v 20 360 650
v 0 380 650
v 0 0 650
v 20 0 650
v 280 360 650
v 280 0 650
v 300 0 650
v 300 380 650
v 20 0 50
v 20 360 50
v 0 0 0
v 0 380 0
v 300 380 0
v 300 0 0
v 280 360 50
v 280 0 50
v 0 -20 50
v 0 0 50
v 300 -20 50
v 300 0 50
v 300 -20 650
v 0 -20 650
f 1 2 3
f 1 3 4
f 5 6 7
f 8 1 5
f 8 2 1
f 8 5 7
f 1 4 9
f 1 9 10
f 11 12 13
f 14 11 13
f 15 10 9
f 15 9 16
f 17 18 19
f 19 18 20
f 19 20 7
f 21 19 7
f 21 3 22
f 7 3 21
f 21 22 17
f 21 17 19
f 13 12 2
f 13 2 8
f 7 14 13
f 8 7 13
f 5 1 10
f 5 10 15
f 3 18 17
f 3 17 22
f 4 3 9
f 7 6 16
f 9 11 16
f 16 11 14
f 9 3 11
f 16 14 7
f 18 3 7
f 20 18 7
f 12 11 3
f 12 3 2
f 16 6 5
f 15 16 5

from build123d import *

# Parameters (mm, degrees)
F2_W     = 300
F2_H     = 380
F3_DEPTH = 650
F4_W     = 300
F4_H     = 600
F5_DEPTH = 20
F6_W     = 260
F6_H     = 360
F7_DEPTH = 600


with BuildPart() as f3:
    # F2 (on Top) → F3 (new body)
    with BuildSketch(Plane.XY):
        with Locations((150, 190)):
            Rectangle(F2_W, F2_H)
    extrude(amount=F3_DEPTH)

    # F6 (on face) → F7 (cut, through all)
    with BuildSketch(Plane.XY.offset(650)):
        with Locations((150, 180)):
            Rectangle(F6_W, F6_H)
    extrude(amount=-F7_DEPTH, mode=Mode.SUBTRACT)


with BuildPart() as f5:
    # F4 (on face) → F5 (new body)
    with BuildSketch(Plane.XZ):
        with Locations((150, 350)):
            Rectangle(F4_W, F4_H)
    extrude(amount=F5_DEPTH)


solid = Compound([f3.part, f5.part])
